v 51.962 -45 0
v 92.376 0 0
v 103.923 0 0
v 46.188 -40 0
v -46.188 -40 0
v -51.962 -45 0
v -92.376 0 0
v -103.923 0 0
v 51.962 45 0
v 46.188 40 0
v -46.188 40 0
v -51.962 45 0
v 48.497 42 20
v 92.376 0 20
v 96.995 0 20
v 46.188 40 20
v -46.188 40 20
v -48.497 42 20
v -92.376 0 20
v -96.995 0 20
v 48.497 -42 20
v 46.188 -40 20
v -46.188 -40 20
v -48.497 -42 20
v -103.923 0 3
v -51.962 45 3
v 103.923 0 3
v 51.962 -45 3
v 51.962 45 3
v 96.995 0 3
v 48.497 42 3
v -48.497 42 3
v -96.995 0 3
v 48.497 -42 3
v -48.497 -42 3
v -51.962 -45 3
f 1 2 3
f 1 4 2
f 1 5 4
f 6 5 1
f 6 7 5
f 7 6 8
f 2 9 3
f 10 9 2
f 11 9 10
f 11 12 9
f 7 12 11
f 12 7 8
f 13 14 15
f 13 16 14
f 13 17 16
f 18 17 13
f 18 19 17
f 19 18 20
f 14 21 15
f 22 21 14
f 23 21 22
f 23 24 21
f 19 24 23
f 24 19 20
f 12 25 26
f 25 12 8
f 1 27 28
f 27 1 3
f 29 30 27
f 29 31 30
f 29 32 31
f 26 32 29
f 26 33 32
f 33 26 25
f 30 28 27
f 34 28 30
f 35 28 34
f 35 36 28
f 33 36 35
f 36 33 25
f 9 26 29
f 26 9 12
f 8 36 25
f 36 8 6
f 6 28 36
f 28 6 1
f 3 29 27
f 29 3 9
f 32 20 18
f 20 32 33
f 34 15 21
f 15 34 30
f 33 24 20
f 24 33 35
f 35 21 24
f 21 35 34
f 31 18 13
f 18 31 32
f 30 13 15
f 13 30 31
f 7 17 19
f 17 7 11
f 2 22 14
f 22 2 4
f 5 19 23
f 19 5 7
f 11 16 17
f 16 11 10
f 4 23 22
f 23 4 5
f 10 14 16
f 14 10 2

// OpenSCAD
// Float for seven 15 mL conical tubes, printed upside down.
// It rests on the XY plane at z = 0 and builds upward (+Z).
// When flipped for use, the skirt and sleeves trap air under the plate.

$fn = 64;

// ---- Plate (regular hexagon, 90 mm across the flats, 3 mm thick) ----
plate_af  = 90;   // across the flats of the plate hexagon
plate_t   = 3;    // plate thickness (z = 0 to 3)
plate_ap  = plate_af * 2 / sqrt(3);  // across the corners = 103.923

// ---- Seven 17.5 mm through-holes: one at centre, six on a 54 mm circle ----
hole_d    = 17.5; // hole diameter
hole_r    = hole_d / 2;
ring_d    = 54;   // diameter of the circle carrying the six outer holes
ring_r    = ring_d / 2;

// ---- Sleeves: 2 mm wall, 21.5 mm outside, rising from the plate to z = 20 ----
sleeve_od = 21.5; // sleeve outside diameter
sleeve_id = sleeve_od - 2 * 2; // sleeve inside diameter (17.5)
sleeve_h  = 20;   // sleeve top height (z = 0 to 20)

// ---- Hexagonal skirt: 2 mm wall, 84 mm across the flats outside ----
skirt_af  = 84;   // across the flats of the skirt (outside)
skirt_ap  = skirt_af * 2 / sqrt(3); // across the corners of the skirt
skirt_h   = 20;   // skirt top height (z = 0 to 20)

// ---- Helper: regular hexagon polygon (flat sides parallel to X axis) ----
module hexagon(af) {
    ap = af * 2 / sqrt(3);
    polygon(points=[
        [ ap,  0],
        [ ap/2,  af/2],
        [-ap/2,  af/2],
        [-ap,   0],
        [-ap/2, -af/2],
        [ ap/2, -af/2]
    ]);
}

// ---- Hole centre positions (one at origin, six on the 54 mm circle) ----
hole_pos = [
    [0, 0],
    [ring_r, 0],
    [ring_r * cos(60), ring_r * sin(60)],
    [ring_r * cos(120), ring_r * sin(120)],
    [ring_r * cos(180), ring_r * sin(180)],
    [ring_r * cos(240), ring_r * sin(240)],
    [ring_r * cos(300), ring_r * sin(300)]
];

// ---- Build the float ----
difference() {
    // Union of all solid material
    union() {
        // Flat hexagonal plate (z = 0 to 3)
        linear_extrude(plate_t) hexagon(plate_af);

        // Seven sleeves (z = 0 to 20)
        for (p = hole_pos) {
            translate([p[0], p[1], 0])
                cylinder(h = sleeve_h, d = sleeve_od, $fn = $fn);
        }

        // Hexagonal skirt (z = 0 to 20)
        linear_extrude(skirt_h) hexagon(skirt_af);
    }

    // Cut the seven 17.5 mm through-holes (extend 1 mm past each face)
    for (p = hole_pos) {
        translate([p[0], p[1], -1])
            cylinder(h = sleeve_h + 2, d = hole_d, $fn = $fn);
    }

    // Cut the skirt wall: remove the interior of the skirt hexagon (z = 0 to 20)
    // The 1 mm overhangs ensure no coplanar faces with the plate or sleeve tops.
    translate([0, 0, -1])
        linear_extrude(skirt_h + 2)
        hexagon(skirt_af - 2 * 2); // 80 mm across the flats (inside of the 2 mm wall)
}
